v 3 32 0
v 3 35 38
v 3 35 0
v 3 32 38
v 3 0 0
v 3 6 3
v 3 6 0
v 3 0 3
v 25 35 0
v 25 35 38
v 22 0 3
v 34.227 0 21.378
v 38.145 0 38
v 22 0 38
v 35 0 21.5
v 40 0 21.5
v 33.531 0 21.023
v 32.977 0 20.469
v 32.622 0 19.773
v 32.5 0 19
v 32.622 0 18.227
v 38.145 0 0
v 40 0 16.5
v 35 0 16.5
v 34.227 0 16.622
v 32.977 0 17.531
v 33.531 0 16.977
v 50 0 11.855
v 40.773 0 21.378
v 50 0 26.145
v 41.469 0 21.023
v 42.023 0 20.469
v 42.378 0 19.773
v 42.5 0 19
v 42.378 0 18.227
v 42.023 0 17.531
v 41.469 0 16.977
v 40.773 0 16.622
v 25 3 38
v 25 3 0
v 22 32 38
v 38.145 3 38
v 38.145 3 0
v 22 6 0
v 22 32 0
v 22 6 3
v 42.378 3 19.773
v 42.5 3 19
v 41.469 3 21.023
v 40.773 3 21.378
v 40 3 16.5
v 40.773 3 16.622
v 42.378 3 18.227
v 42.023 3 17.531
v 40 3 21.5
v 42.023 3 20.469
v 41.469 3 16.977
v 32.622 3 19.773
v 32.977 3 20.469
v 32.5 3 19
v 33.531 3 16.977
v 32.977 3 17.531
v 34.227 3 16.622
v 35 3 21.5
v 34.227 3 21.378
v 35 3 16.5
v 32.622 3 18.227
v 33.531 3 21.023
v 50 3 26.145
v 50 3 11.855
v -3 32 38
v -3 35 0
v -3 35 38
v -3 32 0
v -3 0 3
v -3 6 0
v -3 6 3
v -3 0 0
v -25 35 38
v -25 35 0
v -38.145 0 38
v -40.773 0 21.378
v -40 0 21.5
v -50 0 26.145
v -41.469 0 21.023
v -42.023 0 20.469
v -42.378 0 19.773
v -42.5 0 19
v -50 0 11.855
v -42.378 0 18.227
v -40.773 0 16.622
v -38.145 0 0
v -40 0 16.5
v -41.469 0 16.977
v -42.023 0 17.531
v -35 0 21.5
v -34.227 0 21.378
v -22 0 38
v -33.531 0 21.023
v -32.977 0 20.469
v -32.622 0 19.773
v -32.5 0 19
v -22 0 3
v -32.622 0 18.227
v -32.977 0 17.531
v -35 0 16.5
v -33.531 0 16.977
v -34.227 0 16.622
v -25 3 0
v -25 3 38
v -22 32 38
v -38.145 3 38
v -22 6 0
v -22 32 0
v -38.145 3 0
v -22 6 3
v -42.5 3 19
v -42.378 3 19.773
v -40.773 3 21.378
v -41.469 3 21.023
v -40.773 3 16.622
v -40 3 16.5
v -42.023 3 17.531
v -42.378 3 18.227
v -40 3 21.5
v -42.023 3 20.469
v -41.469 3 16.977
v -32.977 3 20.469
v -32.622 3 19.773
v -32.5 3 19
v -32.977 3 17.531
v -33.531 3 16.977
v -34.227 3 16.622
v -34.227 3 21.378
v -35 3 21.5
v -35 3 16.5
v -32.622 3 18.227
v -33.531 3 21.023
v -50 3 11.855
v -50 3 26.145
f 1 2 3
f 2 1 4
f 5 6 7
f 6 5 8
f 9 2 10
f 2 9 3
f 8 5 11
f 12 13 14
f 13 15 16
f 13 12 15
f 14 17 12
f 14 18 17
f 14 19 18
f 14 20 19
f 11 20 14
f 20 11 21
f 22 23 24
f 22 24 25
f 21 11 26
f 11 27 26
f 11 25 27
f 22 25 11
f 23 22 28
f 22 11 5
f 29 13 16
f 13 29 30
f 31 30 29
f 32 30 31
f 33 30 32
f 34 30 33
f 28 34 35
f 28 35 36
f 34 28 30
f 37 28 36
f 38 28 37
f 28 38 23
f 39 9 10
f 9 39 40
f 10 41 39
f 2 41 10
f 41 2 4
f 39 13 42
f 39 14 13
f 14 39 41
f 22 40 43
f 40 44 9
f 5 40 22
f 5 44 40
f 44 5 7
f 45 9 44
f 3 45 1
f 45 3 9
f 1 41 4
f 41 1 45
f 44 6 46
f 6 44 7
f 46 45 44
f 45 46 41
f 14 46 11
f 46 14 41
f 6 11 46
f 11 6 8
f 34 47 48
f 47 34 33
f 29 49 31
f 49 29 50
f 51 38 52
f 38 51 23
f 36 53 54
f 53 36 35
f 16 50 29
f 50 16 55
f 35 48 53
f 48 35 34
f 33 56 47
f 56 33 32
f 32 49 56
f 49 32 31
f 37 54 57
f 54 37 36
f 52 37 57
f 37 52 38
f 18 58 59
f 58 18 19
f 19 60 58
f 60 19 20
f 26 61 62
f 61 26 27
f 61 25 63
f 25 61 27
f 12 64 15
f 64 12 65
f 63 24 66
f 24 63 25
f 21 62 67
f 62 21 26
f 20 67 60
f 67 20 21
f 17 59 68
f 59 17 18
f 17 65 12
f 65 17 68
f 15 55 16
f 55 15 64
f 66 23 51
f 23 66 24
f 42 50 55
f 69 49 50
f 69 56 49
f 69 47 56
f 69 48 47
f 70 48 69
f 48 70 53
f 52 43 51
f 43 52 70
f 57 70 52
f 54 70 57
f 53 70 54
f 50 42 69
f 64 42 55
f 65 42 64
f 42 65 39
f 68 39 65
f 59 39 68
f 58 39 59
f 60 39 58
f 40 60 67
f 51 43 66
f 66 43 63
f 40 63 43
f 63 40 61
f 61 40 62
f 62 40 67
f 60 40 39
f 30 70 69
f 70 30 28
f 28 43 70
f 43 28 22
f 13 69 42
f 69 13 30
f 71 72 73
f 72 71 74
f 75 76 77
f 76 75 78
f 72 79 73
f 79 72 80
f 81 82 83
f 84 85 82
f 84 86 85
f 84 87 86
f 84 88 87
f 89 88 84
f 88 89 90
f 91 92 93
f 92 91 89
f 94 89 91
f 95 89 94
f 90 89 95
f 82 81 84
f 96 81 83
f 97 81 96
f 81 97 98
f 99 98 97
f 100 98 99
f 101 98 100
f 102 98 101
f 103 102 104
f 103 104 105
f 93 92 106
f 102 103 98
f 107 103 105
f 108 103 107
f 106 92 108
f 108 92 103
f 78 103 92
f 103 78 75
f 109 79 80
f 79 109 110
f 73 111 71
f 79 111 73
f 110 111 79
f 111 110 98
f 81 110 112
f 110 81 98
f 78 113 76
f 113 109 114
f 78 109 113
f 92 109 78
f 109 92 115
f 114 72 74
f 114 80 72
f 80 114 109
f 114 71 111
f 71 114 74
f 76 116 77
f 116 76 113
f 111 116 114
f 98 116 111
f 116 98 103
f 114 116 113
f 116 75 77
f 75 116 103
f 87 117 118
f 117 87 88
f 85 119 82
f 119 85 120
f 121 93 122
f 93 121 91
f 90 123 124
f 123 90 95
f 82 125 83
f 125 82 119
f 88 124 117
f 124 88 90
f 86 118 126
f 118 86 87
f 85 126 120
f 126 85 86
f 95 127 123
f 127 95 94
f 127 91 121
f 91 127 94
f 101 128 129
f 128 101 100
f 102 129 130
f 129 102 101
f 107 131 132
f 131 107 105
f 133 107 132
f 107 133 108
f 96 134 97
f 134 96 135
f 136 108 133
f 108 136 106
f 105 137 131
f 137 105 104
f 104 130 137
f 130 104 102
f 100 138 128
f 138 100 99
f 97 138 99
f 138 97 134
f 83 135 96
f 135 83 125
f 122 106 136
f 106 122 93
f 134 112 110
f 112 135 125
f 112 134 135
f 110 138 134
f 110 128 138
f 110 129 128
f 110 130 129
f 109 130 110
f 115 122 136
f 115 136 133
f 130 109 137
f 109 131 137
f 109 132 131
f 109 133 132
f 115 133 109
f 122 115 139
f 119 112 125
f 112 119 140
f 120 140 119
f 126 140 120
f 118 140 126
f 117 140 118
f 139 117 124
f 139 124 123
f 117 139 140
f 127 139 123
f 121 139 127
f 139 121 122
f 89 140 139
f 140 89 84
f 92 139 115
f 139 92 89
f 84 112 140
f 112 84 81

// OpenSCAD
// [FL_INDEX: keywords="openscad, 3d_parametric, Box_holder_clamp, csg_solid" | COT="Parametric OpenSCAD design from 3DCodeverse"]
// Title: Box holder clamp

//
//  Variable size box retainer for mounting
//  on a wall.
//
//  The main intention of this Thing is
//  to provide mounting for a Linksys Hub
//
//	  R. Lazure, February 16, 2014
//
//
//  ------------------------
//  inputs
//
/* [Box] */

//  Holding a box with a height of ...
box_ht = 32;  // [10:50]
//  Bottom of the holder has a block height of
block_ht= 6; // [0:45]
//  Top of the holder has a tab 
top_tab= 0;  // [0:45]
//  Side of the holder has a tab
side_tab = 0; // [0:30]
//  Length of the holder
length= 38; // [20:100]
//	 Holder width
box_wd = 19; // [10:50]
//
/* [Holding tab] */
//  Width of the tab that holds the screw
tab_width = 25;  // [15:75]
//  screw diameter
screw_dia=5; // [3:15]
//  center to center play in slot
slot_sp=5; // [0:15]
//  wall thickness  
thickness = 3; // [2:5]

/* [Hidden] */
$fn=20;
//
//   -------------------------
//		Module:  Housing
//	  -------------------------
//
module housing() {
difference()
	{
	difference ()
	{
//  outer block
	cube([thickness+box_wd,length,box_ht+thickness]);
	translate([thickness+side_tab,0,block_ht]) cube([box_wd+2, length+2,box_ht-block_ht-top_tab]);
	}
translate ([thickness,thickness,0]) cube([box_wd,length,box_ht]);
	}
}
//
//   -------------------------
//		Module:  tab
//	  -------------------------
// 
module tab() {
//
difference() {
// bottom plate
translate ([-tab_width,0,0]) cube([tab_width,length,thickness]);
//
//  slot position
translate([-tab_width/2-slot_sp/2,length/2,0])
//   slot
union(){
translate([0,0,-1])
cylinder(h=thickness+2,r=screw_dia/2);
translate([slot_sp,0,-1])
cylinder(h=thickness+2,r=screw_dia/2);
translate([0,-screw_dia/2,-1])
cube([slot_sp,screw_dia,thickness+2]);
		}
	}
}
//
//		-------------------
//		Module: box holder
//		-------------------
//
module box_holder() {
housing();
difference() {
difference() {
tab();
//     chamfer 1
// create a large cube rotated 45 degrees to cut the corner
translate([-tab_width-2.5,-tab_width+4,-1])
rotate([0,0,45])
cube([tab_width,tab_width,thickness+2]);
             }
//		 chamfer 2
// create a large cube rotated 45 degrees to cut the corner
translate([-tab_width*1.9,length+1,-1])
rotate([0,0,-45])
cube([tab_width,tab_width,thickness+2]);
              }
}
//		-------------
//   			Main
//		-------------
//
//  for Thingiverse Customizer
//  two clamps are made

//   rotate for proper orientation
//  in MakerWare for slicing
//
rotate([90,0,180]) {
//	  original clamp
translate([-box_wd-thickness-3,0,0])
box_holder();
//   mirror copy of the same clamp
mirror([1,0,0])
translate([-box_wd-thickness-3,0,0])
box_holder();
				}
